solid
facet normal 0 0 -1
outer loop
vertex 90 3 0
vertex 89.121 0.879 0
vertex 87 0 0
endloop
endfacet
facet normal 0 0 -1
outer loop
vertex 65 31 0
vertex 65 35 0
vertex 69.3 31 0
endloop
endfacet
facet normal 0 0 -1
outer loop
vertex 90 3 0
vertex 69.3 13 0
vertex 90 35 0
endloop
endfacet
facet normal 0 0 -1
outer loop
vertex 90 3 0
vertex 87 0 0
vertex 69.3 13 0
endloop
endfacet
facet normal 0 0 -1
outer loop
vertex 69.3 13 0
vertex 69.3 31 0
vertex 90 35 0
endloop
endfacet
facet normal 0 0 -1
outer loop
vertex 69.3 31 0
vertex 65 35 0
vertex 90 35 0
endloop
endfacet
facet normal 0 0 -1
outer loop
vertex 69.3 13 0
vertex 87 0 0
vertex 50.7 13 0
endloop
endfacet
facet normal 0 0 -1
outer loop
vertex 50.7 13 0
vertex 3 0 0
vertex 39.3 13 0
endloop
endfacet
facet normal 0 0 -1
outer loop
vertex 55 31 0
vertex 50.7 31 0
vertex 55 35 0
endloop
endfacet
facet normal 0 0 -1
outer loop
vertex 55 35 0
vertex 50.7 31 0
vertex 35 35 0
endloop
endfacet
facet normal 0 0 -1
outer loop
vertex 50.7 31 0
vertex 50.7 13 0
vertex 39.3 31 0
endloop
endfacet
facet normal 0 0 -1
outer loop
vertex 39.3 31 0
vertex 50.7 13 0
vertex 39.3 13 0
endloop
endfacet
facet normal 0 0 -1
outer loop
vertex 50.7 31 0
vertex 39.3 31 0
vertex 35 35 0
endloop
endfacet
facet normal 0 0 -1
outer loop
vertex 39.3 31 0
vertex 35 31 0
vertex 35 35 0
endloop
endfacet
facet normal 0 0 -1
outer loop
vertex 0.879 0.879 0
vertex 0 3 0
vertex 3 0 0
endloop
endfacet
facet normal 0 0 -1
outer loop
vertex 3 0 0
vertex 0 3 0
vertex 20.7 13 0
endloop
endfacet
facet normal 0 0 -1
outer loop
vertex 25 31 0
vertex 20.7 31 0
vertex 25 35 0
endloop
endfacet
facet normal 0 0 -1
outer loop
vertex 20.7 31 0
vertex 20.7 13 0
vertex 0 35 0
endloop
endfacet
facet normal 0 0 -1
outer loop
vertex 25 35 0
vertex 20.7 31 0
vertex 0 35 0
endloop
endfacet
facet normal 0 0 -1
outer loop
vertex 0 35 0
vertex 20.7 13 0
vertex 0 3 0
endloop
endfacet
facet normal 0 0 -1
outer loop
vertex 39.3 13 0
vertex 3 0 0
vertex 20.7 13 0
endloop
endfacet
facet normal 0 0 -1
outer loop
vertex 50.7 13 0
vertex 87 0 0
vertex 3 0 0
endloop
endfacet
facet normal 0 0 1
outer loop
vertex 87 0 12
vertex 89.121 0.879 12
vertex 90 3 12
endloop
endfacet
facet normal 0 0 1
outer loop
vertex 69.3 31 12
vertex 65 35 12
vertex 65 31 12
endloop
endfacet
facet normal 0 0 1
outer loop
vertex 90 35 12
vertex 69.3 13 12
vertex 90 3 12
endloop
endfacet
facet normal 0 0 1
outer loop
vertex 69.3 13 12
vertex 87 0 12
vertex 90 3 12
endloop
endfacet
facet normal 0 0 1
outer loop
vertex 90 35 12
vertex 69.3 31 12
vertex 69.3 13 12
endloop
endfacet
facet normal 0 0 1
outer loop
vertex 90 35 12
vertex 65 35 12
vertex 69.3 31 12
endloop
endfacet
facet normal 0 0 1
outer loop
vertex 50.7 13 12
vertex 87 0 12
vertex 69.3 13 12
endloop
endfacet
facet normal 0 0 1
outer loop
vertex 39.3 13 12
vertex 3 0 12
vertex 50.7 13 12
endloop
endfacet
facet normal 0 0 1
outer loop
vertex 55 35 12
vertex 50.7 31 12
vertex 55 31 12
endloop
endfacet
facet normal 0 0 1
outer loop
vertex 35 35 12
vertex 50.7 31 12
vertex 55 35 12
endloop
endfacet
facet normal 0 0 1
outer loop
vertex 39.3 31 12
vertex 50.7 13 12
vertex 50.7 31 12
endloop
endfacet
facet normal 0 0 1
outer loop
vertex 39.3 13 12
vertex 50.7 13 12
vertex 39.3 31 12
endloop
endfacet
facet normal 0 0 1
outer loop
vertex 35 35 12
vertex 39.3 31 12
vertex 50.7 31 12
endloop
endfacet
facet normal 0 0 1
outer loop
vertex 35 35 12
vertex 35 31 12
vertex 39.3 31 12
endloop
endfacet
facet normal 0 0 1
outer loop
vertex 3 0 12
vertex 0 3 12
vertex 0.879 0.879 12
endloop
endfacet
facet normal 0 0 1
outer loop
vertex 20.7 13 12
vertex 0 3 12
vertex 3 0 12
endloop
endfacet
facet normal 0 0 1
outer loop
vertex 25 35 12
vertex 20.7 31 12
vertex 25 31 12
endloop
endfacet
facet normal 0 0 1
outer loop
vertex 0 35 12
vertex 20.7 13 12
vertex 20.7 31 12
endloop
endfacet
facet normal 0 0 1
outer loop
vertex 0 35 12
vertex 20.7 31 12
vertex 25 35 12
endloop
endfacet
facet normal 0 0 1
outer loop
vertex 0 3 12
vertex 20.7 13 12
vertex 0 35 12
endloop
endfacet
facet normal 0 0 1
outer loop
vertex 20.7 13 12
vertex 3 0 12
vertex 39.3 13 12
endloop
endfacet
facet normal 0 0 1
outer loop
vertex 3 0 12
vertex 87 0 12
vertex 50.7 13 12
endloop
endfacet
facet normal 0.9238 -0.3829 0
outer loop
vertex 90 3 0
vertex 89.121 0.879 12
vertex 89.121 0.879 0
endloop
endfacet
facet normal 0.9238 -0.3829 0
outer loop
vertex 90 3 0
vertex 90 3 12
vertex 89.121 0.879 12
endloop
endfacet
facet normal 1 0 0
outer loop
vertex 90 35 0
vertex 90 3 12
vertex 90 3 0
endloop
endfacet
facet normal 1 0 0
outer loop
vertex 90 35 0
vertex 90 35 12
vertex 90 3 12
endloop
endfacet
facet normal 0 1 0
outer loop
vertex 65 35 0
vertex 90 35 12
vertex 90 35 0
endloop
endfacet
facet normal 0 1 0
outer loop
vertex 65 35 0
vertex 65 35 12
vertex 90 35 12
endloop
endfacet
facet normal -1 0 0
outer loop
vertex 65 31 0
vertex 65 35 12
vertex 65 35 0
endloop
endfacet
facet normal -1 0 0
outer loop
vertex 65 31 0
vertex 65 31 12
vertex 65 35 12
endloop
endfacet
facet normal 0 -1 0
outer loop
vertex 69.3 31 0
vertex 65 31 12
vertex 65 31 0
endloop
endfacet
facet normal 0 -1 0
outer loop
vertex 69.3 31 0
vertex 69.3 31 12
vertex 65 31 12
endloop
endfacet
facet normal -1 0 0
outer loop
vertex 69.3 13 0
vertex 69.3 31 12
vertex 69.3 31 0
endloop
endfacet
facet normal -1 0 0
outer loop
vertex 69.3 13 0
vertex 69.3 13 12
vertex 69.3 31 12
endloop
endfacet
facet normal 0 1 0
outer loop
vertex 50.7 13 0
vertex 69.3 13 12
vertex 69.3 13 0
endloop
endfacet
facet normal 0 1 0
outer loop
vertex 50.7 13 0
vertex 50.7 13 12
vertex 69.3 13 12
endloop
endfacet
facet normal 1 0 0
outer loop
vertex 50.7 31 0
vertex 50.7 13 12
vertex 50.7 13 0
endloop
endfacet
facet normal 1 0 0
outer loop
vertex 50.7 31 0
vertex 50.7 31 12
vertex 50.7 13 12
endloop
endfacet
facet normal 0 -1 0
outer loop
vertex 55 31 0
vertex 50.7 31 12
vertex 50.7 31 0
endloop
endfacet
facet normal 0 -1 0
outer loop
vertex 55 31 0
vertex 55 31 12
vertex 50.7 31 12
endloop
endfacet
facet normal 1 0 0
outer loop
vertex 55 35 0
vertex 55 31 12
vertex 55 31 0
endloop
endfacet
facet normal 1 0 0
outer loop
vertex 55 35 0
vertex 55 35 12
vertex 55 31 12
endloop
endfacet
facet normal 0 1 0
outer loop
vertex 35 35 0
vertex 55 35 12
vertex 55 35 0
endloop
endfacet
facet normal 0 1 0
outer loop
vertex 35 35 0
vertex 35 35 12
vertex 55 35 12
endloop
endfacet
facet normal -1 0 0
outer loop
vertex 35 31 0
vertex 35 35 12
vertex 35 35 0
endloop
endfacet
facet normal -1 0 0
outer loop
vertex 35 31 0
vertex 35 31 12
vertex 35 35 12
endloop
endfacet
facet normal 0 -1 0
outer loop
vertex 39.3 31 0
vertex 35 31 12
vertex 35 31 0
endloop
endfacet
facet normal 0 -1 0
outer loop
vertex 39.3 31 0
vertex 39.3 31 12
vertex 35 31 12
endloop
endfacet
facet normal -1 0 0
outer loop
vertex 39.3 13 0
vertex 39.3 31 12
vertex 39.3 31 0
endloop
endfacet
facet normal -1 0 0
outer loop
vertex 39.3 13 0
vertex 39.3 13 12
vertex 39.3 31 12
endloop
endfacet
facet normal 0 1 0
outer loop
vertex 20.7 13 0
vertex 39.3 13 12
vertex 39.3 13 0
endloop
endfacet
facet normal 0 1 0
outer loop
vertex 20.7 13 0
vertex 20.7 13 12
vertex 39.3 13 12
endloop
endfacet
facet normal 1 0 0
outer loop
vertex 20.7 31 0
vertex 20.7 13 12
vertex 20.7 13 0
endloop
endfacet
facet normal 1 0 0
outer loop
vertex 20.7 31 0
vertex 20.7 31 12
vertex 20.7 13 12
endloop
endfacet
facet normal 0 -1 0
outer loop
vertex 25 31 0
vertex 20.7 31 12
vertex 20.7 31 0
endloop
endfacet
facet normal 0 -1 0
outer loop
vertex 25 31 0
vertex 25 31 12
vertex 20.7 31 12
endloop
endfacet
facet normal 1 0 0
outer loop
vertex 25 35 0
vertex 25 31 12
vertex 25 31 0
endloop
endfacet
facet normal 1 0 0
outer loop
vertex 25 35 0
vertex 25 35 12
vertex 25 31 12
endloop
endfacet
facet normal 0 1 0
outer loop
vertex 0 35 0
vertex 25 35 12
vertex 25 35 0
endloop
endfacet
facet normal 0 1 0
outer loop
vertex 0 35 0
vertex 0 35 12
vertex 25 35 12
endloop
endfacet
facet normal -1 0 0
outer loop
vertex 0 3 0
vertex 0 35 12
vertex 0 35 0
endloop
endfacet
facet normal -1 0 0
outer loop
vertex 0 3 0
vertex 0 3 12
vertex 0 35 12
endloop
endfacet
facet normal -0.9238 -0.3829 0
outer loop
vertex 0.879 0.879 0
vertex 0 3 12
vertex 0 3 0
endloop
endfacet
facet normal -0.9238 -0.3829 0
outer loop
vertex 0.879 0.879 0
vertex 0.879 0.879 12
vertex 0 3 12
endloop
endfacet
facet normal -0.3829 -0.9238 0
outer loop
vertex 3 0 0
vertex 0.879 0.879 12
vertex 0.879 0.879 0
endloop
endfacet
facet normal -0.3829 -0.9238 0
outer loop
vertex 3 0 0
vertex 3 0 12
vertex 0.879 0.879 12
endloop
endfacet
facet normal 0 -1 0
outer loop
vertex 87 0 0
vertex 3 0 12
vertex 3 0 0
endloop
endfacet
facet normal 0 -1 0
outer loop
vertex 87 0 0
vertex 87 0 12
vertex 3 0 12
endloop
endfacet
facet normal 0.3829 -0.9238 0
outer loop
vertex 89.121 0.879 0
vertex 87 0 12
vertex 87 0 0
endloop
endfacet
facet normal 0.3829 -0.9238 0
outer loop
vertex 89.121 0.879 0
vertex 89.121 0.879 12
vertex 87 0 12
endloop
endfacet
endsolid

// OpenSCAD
$fn = 32;

// ----------------------------------------------------------------------
// Window plate: 90 x 35 mm, 2 open windows
// ----------------------------------------------------------------------

// --- parameters (mm) ---
profile_height = 12;      // extrusion height
profile_points = 24;      // points of the closed outline

profile = [[0, 3], [0.879, 0.879], [3, 0], [87, 0], [89.121, 0.879], [90, 3], [90, 35], [65, 35], [65, 31], [69.3, 31], [69.3, 13], [50.7, 13], [50.7, 31], [55, 31], [55, 35], [35, 35], [35, 31], [39.3, 31], [39.3, 13], [20.7, 13], [20.7, 31], [25, 31], [25, 35], [0, 35]];  // single closed polygon, 24 points, counter clockwise

// --- the one profile operation ---
linear_extrude(height = profile_height) polygon(points = profile);
